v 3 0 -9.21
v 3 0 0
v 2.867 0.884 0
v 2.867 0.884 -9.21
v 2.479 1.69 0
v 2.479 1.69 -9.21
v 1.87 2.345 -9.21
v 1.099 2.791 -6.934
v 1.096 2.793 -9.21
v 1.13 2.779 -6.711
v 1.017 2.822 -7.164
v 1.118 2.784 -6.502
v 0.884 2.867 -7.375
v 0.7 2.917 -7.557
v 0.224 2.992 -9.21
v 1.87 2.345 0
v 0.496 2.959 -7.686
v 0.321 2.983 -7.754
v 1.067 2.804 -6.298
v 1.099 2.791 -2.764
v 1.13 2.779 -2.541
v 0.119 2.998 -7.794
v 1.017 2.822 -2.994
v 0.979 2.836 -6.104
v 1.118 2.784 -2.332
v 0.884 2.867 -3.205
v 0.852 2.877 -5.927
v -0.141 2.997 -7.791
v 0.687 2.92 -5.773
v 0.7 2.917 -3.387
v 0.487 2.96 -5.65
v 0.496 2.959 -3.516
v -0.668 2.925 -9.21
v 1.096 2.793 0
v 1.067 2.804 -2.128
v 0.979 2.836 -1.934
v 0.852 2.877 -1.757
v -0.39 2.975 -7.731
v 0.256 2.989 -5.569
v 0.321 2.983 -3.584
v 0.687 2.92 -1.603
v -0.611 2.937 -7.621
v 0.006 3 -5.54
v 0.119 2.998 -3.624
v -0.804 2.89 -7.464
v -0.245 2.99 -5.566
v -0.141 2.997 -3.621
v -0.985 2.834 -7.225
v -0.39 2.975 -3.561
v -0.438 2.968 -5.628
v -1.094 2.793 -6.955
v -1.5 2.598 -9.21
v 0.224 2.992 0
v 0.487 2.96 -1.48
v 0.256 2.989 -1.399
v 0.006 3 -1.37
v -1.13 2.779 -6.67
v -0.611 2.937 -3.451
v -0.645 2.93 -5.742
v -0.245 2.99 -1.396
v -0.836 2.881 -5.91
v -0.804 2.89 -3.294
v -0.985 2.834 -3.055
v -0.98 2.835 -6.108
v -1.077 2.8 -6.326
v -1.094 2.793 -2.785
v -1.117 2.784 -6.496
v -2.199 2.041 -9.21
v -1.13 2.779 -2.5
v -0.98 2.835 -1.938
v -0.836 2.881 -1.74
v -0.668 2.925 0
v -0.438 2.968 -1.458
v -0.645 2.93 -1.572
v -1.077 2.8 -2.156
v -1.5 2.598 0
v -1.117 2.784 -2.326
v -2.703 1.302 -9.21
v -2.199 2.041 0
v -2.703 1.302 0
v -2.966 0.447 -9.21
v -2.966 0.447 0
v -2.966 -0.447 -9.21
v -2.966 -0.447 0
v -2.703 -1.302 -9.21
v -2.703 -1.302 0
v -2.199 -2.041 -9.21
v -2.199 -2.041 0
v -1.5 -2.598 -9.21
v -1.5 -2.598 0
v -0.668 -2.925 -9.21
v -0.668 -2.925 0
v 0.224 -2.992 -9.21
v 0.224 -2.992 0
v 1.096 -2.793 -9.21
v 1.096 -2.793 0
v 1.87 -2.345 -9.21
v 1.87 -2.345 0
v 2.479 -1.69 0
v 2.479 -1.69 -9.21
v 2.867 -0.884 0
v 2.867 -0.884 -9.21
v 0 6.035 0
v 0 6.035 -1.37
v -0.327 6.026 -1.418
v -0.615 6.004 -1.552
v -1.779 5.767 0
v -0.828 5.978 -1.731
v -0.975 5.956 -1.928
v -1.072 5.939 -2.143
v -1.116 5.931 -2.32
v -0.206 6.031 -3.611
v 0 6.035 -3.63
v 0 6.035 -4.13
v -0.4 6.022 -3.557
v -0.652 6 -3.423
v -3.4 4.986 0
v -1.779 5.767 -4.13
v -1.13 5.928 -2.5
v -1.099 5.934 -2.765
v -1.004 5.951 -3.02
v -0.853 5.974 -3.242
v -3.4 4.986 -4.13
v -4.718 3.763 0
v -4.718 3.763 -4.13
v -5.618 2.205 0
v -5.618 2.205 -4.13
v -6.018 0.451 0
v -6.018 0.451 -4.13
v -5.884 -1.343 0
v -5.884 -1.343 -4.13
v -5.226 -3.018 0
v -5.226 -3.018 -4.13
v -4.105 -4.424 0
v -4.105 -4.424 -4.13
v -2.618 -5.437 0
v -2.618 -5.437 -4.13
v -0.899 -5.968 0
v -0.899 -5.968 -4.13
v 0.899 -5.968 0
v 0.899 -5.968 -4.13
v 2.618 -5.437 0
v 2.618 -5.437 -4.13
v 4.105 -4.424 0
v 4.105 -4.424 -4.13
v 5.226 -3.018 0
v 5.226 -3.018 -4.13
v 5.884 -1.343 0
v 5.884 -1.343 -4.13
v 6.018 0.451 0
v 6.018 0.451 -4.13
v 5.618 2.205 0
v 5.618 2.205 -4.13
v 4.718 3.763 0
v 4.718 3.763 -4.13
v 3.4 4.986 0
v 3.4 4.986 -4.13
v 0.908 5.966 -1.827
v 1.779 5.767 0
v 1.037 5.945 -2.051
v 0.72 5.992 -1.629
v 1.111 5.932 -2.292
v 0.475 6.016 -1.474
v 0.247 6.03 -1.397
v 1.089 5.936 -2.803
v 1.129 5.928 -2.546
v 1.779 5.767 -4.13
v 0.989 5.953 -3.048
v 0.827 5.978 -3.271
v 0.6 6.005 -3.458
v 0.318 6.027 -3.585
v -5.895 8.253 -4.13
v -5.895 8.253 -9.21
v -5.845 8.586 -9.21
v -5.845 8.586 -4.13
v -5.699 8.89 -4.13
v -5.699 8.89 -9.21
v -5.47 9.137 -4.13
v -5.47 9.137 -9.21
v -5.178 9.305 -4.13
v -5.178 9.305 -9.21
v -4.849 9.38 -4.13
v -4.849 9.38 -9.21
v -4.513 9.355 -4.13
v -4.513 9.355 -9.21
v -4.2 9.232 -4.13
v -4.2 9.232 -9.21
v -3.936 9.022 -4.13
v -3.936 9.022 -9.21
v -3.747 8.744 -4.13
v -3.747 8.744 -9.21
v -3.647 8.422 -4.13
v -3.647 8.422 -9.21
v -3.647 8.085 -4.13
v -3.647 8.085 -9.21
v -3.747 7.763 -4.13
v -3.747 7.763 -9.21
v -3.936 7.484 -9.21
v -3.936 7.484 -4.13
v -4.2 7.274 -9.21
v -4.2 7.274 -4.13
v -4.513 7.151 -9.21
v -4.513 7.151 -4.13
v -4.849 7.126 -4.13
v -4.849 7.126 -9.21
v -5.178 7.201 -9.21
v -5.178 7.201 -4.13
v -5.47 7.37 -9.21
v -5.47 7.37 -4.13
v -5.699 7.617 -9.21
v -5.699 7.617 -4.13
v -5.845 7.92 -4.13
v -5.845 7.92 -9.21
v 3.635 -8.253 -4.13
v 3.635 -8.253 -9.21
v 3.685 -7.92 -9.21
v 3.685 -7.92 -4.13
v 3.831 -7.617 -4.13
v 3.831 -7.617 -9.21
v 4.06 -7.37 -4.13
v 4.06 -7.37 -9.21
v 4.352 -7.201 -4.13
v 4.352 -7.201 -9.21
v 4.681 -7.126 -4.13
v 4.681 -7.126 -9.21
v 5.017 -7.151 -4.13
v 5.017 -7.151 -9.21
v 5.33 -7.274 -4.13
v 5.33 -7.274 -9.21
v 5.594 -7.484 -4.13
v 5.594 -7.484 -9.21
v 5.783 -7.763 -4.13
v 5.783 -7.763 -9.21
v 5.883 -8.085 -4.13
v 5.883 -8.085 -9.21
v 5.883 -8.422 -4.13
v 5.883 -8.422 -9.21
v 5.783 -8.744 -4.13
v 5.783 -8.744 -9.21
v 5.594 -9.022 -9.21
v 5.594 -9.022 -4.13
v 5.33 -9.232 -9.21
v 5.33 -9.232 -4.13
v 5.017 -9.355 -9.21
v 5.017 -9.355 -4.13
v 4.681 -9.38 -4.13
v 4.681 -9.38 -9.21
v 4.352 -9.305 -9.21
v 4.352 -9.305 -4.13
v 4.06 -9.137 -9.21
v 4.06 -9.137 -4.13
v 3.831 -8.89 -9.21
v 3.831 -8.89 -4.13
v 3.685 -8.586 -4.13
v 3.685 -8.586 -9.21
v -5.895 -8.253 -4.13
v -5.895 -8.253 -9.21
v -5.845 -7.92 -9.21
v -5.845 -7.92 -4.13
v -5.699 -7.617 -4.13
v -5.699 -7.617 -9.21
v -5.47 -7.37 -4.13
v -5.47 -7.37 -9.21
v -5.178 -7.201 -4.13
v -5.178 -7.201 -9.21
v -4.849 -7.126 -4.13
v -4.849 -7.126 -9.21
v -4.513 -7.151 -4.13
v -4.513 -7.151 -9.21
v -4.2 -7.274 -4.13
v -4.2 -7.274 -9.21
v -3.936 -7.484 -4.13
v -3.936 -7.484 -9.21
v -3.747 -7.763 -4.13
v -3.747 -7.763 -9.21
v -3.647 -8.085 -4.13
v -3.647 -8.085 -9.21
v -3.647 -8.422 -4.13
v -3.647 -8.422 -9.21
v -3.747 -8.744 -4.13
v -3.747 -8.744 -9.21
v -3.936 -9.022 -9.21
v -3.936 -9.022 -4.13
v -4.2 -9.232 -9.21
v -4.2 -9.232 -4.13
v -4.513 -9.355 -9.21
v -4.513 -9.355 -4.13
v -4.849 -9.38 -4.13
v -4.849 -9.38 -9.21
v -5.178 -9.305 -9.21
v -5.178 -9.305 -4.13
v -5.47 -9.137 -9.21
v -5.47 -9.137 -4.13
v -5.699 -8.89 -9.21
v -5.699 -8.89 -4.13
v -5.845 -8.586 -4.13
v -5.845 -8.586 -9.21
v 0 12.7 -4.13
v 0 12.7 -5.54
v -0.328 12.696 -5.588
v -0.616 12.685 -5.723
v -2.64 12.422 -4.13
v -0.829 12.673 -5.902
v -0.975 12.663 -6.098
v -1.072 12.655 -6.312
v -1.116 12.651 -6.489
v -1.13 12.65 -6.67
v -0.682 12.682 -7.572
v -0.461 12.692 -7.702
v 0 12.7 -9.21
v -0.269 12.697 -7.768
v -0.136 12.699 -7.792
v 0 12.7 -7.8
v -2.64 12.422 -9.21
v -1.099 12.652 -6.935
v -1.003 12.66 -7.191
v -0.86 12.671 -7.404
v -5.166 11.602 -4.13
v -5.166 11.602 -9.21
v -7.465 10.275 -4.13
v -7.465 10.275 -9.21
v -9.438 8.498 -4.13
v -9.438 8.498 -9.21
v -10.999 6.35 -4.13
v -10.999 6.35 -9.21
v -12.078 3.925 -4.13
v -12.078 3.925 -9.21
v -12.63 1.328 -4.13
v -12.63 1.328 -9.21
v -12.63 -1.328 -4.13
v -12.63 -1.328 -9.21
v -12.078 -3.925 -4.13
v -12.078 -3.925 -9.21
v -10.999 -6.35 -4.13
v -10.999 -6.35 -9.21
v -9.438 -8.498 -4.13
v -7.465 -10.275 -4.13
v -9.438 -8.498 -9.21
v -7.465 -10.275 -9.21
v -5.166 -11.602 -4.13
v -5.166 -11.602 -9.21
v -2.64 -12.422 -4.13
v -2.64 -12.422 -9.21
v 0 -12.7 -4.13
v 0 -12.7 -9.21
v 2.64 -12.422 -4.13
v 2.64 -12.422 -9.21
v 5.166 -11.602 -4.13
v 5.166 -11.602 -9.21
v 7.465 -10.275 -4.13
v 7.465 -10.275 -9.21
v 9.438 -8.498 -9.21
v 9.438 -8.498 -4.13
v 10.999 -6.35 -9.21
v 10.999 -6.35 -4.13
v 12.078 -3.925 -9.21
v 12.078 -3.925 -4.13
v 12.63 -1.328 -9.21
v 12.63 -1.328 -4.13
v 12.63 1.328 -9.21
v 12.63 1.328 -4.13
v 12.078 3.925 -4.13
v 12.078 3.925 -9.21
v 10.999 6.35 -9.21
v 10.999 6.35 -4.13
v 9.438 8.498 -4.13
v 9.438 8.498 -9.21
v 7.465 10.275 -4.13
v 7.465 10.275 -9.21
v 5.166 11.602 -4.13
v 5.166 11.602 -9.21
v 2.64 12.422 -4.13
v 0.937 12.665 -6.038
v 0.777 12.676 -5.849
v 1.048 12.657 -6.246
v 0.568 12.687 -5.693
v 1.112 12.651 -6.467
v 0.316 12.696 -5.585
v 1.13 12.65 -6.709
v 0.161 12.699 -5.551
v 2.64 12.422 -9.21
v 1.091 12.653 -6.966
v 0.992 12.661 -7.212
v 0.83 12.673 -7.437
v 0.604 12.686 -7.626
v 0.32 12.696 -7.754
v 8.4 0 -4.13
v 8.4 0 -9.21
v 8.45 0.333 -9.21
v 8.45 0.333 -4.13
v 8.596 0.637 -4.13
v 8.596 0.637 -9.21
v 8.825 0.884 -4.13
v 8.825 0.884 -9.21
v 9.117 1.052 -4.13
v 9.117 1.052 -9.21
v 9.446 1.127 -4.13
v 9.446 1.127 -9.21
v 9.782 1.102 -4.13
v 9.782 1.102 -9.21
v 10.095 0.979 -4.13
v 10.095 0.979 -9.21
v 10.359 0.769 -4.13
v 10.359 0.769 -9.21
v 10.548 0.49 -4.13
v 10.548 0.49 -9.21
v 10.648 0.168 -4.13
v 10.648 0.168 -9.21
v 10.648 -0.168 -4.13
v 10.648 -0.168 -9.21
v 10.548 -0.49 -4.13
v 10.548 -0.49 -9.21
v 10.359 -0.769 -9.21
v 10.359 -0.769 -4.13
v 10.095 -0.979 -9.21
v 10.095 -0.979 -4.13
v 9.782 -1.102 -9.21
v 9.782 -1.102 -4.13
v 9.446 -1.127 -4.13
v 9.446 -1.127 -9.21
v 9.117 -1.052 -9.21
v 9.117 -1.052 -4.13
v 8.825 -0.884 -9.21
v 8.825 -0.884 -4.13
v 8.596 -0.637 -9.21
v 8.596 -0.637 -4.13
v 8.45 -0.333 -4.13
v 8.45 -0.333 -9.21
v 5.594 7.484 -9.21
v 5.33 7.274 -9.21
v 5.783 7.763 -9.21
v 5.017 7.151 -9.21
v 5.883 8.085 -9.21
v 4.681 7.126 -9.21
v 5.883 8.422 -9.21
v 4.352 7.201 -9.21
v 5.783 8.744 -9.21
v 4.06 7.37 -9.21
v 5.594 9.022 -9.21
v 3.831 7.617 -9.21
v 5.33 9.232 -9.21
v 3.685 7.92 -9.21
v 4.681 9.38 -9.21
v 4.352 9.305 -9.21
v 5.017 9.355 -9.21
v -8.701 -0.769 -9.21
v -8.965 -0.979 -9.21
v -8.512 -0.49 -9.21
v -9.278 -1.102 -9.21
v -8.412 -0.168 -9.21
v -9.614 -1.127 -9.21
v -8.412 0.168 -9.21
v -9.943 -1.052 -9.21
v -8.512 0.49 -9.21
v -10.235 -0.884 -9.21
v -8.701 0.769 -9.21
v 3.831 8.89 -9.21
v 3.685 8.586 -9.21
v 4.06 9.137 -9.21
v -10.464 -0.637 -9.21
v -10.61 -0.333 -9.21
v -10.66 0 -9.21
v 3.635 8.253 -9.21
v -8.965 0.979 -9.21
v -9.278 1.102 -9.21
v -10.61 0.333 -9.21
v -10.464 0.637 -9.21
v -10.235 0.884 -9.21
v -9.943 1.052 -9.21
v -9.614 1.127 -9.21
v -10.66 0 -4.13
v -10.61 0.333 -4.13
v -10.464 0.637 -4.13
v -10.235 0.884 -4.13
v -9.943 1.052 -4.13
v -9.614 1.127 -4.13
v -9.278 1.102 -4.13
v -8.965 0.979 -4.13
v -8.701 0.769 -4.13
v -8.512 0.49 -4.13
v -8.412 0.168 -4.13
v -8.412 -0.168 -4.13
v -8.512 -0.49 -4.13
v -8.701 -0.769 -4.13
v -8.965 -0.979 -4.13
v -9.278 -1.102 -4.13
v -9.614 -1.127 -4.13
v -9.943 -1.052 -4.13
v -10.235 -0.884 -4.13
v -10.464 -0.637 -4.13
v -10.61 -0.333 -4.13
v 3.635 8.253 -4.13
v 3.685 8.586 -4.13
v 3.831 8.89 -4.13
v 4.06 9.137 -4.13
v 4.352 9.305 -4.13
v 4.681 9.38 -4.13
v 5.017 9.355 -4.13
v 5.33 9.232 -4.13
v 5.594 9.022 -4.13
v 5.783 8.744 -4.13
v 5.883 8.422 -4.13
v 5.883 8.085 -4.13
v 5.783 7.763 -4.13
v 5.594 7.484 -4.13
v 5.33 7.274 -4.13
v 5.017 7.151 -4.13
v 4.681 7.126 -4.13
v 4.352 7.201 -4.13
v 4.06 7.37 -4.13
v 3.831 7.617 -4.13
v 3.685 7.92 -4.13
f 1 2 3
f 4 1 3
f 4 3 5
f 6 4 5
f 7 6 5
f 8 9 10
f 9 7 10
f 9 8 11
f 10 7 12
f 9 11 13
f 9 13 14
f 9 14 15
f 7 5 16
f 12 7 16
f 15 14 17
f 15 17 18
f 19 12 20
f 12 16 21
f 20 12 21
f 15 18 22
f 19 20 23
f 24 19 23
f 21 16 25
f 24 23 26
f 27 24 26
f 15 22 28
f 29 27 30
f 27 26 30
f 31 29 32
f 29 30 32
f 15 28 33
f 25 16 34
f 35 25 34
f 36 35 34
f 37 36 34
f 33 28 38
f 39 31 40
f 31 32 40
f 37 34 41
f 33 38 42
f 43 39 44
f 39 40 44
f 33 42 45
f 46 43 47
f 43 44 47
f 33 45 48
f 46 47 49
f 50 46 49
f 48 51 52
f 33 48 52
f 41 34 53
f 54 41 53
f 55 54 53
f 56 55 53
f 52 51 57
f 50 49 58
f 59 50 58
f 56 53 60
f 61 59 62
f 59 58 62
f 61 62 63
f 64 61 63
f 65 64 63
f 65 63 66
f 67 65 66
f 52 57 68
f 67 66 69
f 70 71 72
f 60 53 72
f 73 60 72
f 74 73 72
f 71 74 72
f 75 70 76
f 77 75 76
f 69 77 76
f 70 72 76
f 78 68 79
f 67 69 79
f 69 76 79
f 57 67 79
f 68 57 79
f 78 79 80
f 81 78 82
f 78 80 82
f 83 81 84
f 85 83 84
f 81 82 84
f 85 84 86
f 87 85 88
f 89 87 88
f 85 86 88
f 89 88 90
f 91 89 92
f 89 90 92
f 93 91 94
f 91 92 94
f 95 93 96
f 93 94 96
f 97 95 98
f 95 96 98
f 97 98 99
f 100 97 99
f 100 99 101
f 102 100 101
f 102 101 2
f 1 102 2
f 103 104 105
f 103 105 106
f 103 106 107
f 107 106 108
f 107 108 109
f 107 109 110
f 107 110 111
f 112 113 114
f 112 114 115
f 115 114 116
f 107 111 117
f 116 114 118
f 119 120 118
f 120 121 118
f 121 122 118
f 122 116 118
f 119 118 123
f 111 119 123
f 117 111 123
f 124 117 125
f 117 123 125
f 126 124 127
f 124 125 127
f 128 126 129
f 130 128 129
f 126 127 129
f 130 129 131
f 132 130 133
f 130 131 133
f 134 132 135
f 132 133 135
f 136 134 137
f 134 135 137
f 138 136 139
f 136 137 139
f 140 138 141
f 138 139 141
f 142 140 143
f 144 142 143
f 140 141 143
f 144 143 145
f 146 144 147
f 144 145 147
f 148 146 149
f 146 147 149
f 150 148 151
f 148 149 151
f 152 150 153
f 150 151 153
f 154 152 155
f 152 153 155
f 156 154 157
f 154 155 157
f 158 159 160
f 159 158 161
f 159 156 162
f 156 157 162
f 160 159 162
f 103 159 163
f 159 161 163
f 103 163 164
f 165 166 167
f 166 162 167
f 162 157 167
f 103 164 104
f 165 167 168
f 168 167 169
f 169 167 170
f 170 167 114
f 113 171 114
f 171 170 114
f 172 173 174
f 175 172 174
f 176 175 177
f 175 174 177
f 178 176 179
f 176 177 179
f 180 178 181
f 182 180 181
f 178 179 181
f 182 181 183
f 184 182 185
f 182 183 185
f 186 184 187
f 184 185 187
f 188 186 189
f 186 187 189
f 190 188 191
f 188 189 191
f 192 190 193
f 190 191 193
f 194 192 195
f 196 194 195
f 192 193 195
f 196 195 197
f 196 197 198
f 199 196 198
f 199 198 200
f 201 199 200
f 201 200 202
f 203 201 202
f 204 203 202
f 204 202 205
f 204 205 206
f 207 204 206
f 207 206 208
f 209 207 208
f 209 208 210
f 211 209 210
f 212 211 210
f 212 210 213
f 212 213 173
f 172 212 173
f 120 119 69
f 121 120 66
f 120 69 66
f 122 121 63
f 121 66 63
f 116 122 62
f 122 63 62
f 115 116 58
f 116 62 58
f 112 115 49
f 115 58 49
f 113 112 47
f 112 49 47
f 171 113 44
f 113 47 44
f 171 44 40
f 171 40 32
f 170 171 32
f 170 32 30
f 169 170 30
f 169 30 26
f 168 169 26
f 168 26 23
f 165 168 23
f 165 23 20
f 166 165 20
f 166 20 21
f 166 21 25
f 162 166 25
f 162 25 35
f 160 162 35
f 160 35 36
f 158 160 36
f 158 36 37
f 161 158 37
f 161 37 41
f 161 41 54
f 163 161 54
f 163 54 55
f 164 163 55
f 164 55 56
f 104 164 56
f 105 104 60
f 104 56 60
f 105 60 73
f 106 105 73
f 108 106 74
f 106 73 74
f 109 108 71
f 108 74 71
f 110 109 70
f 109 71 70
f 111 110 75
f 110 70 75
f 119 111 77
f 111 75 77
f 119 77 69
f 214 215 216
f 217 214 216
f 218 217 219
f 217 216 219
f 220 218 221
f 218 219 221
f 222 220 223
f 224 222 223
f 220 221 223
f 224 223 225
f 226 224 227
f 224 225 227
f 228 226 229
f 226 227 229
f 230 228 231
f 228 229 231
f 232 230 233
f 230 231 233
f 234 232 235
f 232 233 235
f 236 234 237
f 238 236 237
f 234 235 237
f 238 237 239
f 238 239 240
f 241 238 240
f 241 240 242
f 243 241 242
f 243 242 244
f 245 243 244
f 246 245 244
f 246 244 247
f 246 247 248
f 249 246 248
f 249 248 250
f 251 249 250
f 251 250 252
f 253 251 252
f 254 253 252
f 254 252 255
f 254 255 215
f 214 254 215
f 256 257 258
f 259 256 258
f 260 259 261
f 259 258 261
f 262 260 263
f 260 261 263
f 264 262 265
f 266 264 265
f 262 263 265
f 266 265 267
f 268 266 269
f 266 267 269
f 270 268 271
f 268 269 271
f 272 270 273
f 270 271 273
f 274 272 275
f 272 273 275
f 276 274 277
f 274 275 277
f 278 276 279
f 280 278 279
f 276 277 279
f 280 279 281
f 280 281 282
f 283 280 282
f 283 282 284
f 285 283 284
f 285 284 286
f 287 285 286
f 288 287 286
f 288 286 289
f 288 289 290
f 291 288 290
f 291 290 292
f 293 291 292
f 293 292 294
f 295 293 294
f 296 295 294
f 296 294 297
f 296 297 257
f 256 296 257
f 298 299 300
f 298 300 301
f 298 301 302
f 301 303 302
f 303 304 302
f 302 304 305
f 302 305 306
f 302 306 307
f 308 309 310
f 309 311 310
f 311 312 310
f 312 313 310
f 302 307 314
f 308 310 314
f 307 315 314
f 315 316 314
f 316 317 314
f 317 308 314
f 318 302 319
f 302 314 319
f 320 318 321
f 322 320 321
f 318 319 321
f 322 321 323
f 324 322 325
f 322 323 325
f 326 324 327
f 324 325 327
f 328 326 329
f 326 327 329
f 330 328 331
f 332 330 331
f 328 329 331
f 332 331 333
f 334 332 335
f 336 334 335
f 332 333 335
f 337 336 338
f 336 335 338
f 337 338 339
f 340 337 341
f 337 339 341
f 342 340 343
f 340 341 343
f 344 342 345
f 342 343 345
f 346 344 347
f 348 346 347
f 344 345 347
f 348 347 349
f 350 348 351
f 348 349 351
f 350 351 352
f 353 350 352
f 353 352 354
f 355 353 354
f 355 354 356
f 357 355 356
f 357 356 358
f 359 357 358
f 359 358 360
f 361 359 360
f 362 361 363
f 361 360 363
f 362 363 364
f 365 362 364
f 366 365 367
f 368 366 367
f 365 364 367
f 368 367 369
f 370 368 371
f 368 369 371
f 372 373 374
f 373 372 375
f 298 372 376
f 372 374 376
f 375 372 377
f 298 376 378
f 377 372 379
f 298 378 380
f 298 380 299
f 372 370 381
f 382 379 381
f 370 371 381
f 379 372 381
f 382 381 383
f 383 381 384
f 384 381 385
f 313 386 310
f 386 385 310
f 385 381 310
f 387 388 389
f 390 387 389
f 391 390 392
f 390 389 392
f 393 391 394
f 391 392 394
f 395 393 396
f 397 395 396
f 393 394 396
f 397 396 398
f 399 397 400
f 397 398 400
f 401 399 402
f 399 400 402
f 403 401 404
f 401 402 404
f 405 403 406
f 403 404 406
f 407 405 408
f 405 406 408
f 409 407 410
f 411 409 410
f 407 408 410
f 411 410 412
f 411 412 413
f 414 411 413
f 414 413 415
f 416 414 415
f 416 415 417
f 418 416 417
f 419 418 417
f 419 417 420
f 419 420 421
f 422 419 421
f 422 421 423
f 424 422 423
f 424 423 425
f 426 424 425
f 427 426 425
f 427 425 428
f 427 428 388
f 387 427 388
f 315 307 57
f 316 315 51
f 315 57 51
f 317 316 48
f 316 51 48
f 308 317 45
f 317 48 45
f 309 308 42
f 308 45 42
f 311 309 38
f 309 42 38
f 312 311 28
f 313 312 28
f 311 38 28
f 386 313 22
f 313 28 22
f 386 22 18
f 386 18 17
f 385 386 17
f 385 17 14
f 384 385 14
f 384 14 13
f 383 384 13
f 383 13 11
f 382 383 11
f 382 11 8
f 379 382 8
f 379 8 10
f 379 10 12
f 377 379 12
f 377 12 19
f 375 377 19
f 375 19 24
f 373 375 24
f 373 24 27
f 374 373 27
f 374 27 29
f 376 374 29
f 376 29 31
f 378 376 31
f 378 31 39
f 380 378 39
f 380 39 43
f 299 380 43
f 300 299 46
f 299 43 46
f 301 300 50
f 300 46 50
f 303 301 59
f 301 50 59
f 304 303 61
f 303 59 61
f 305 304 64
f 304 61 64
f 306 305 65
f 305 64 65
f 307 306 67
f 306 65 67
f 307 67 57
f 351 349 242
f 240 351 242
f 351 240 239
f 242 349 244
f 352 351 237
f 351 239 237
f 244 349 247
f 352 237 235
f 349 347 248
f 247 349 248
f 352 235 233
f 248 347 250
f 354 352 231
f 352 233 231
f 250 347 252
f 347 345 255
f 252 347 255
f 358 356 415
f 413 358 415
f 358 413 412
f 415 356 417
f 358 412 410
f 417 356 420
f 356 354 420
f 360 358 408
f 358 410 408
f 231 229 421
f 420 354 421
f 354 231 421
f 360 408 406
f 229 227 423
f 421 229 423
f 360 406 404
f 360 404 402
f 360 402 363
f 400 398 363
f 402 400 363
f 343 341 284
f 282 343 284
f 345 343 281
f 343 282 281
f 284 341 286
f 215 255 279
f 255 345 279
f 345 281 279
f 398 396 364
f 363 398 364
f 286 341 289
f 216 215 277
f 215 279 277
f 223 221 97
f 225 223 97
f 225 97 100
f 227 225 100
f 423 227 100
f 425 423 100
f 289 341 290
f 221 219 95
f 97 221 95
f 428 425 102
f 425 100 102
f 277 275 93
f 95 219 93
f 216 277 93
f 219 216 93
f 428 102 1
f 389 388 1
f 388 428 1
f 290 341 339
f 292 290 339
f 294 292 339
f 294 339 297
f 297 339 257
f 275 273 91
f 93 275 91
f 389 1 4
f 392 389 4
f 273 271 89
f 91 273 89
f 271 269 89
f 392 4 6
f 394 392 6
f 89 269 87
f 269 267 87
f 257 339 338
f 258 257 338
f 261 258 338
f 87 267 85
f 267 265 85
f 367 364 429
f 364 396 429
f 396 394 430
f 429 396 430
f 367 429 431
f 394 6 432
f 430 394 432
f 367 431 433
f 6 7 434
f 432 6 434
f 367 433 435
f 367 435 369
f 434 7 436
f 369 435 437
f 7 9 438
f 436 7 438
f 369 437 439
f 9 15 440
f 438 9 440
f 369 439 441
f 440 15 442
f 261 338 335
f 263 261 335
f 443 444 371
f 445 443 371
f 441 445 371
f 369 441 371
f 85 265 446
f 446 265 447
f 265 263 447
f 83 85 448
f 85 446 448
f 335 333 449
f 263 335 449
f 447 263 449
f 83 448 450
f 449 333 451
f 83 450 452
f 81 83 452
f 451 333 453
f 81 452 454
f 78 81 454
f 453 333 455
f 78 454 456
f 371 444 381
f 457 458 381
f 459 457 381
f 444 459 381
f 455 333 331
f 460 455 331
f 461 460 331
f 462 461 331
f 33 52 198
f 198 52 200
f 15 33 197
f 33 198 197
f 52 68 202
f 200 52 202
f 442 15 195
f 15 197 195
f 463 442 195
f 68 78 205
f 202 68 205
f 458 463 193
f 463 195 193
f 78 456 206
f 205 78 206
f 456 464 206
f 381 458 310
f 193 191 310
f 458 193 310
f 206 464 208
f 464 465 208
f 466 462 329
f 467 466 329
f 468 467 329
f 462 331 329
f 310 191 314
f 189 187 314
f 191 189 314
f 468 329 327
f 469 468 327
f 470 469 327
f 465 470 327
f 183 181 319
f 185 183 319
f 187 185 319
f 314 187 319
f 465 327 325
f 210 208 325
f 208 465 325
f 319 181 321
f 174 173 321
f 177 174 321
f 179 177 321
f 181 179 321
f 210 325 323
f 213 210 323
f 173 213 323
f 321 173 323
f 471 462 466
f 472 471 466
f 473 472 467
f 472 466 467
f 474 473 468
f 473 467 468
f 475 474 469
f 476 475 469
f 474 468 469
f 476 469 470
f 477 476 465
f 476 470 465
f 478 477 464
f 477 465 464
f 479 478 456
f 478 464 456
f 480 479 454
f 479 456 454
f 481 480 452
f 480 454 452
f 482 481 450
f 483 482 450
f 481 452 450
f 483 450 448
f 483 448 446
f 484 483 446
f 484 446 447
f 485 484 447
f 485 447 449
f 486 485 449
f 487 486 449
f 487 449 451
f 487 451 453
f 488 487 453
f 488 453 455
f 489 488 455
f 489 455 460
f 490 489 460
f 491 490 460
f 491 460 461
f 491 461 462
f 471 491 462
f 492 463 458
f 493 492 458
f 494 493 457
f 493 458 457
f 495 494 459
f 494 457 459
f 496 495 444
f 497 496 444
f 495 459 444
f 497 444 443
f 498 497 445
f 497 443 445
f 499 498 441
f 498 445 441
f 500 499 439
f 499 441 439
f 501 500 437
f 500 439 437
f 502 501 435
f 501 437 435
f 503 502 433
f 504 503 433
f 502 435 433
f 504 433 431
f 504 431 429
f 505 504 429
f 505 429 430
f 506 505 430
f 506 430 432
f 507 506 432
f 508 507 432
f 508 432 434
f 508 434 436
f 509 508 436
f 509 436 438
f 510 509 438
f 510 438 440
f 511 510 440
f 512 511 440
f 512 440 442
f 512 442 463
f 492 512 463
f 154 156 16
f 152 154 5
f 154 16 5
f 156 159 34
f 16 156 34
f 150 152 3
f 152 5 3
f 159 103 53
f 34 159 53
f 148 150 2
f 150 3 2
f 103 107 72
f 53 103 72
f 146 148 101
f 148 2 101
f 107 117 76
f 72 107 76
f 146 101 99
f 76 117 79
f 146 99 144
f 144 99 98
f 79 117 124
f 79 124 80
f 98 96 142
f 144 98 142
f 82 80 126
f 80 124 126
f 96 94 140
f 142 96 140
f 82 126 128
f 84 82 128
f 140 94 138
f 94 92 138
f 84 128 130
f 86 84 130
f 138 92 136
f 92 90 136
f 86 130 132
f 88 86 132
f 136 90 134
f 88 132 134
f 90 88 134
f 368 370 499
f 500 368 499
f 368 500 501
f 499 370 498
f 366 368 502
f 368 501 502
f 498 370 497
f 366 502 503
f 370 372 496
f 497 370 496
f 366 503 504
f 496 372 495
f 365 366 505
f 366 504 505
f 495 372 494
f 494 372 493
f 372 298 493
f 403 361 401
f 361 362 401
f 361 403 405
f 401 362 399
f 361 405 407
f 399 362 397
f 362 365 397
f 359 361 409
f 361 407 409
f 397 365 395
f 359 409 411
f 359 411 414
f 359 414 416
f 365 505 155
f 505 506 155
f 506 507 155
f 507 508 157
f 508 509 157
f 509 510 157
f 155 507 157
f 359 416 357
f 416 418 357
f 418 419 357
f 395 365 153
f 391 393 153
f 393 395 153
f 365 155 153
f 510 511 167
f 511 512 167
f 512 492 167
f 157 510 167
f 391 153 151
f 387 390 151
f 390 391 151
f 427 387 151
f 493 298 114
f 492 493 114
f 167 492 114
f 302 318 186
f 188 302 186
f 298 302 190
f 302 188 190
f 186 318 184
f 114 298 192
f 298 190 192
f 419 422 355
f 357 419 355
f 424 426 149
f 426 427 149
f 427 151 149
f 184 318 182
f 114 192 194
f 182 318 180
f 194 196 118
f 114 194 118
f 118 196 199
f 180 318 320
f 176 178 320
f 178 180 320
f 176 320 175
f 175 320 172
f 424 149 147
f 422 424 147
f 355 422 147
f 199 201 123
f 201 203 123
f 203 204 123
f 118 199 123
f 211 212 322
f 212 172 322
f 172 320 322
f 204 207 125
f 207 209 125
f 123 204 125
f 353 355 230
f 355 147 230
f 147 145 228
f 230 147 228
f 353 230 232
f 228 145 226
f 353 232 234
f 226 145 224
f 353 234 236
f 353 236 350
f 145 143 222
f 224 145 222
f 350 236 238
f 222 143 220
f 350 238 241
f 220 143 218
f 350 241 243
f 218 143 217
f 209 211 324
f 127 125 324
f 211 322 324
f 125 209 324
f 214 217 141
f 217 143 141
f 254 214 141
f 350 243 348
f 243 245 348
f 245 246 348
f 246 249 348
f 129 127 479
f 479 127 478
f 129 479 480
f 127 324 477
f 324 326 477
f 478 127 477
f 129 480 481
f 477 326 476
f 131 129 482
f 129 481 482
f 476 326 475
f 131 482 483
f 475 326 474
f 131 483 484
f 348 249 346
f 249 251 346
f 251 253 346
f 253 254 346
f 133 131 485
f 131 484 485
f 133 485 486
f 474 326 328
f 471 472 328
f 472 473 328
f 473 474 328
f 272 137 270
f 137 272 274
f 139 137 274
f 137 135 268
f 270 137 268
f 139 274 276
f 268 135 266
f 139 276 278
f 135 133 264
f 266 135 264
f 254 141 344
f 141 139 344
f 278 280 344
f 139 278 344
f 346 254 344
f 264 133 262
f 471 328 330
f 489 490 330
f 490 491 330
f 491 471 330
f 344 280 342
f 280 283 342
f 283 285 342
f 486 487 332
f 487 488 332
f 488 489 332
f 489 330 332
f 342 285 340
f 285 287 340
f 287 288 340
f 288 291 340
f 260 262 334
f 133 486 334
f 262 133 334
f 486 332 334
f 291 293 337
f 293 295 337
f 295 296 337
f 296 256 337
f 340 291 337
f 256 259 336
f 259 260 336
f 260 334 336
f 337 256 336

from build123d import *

# Parameters (mm, degrees)
CROQUIS3_R                  = 3
CORTAR_EXTRUIR1_DEPTH       = 21.184253764
TALADRO_ROSCADO_4_403_D     = 2.2606
TALADRO_ROSCADO_4_404_D     = 2.2606
TALADRO_ROSCADO_4_404_DEPTH = 12.699
TALADRO_ROSCADO_4_404_TIP   = 0.679152758


with BuildPart() as part:
    # Croquis2 → Revolución1 (revolve)
    with BuildSketch(Plane(origin=(0, 0, 0), x_dir=(0, 0, -1), z_dir=(1, 0, 0))):
        Polygon((0, 0), (0, 6.035), (4.13, 6.035), (4.13, 12.7), (9.21, 12.7), (9.21, 0), align=None)
    revolve(axis=Axis((0, 0, -9.21), (0, 0, 1)))

    # Croquis3 → Cortar-Extruir1 (cut, through all)
    with BuildSketch(Plane.XY):
        Circle(CROQUIS3_R)
    extrude(amount=-CORTAR_EXTRUIR1_DEPTH, mode=Mode.SUBTRACT)

    # Taladro roscado #4-403 (through all)
    with Locations(Plane.XY.offset(-4.13)):
        with Locations((-9.53, 0), (-4.765, 8.253222098), (4.765, 8.253222098), (9.53, 0), (4.765, -8.253222098), (-4.765, -8.253222098), (0, 0)):
            Hole(TALADRO_ROSCADO_4_403_D / 2)

    # Taladro roscado #4-404
    with Locations(Plane(origin=(0, 12.7, 0), x_dir=(1, 0, 0), z_dir=(0, 1, 0))):
        with Locations((0, 6.67), (0, 2.5)):
            Hole(TALADRO_ROSCADO_4_404_D / 2, depth=TALADRO_ROSCADO_4_404_DEPTH)
            with Locations((0, 0, -(TALADRO_ROSCADO_4_404_DEPTH + TALADRO_ROSCADO_4_404_TIP / 2))):  # 118° drill point
                Cone(0, TALADRO_ROSCADO_4_404_D / 2, TALADRO_ROSCADO_4_404_TIP, mode=Mode.SUBTRACT)


solid = part.part
